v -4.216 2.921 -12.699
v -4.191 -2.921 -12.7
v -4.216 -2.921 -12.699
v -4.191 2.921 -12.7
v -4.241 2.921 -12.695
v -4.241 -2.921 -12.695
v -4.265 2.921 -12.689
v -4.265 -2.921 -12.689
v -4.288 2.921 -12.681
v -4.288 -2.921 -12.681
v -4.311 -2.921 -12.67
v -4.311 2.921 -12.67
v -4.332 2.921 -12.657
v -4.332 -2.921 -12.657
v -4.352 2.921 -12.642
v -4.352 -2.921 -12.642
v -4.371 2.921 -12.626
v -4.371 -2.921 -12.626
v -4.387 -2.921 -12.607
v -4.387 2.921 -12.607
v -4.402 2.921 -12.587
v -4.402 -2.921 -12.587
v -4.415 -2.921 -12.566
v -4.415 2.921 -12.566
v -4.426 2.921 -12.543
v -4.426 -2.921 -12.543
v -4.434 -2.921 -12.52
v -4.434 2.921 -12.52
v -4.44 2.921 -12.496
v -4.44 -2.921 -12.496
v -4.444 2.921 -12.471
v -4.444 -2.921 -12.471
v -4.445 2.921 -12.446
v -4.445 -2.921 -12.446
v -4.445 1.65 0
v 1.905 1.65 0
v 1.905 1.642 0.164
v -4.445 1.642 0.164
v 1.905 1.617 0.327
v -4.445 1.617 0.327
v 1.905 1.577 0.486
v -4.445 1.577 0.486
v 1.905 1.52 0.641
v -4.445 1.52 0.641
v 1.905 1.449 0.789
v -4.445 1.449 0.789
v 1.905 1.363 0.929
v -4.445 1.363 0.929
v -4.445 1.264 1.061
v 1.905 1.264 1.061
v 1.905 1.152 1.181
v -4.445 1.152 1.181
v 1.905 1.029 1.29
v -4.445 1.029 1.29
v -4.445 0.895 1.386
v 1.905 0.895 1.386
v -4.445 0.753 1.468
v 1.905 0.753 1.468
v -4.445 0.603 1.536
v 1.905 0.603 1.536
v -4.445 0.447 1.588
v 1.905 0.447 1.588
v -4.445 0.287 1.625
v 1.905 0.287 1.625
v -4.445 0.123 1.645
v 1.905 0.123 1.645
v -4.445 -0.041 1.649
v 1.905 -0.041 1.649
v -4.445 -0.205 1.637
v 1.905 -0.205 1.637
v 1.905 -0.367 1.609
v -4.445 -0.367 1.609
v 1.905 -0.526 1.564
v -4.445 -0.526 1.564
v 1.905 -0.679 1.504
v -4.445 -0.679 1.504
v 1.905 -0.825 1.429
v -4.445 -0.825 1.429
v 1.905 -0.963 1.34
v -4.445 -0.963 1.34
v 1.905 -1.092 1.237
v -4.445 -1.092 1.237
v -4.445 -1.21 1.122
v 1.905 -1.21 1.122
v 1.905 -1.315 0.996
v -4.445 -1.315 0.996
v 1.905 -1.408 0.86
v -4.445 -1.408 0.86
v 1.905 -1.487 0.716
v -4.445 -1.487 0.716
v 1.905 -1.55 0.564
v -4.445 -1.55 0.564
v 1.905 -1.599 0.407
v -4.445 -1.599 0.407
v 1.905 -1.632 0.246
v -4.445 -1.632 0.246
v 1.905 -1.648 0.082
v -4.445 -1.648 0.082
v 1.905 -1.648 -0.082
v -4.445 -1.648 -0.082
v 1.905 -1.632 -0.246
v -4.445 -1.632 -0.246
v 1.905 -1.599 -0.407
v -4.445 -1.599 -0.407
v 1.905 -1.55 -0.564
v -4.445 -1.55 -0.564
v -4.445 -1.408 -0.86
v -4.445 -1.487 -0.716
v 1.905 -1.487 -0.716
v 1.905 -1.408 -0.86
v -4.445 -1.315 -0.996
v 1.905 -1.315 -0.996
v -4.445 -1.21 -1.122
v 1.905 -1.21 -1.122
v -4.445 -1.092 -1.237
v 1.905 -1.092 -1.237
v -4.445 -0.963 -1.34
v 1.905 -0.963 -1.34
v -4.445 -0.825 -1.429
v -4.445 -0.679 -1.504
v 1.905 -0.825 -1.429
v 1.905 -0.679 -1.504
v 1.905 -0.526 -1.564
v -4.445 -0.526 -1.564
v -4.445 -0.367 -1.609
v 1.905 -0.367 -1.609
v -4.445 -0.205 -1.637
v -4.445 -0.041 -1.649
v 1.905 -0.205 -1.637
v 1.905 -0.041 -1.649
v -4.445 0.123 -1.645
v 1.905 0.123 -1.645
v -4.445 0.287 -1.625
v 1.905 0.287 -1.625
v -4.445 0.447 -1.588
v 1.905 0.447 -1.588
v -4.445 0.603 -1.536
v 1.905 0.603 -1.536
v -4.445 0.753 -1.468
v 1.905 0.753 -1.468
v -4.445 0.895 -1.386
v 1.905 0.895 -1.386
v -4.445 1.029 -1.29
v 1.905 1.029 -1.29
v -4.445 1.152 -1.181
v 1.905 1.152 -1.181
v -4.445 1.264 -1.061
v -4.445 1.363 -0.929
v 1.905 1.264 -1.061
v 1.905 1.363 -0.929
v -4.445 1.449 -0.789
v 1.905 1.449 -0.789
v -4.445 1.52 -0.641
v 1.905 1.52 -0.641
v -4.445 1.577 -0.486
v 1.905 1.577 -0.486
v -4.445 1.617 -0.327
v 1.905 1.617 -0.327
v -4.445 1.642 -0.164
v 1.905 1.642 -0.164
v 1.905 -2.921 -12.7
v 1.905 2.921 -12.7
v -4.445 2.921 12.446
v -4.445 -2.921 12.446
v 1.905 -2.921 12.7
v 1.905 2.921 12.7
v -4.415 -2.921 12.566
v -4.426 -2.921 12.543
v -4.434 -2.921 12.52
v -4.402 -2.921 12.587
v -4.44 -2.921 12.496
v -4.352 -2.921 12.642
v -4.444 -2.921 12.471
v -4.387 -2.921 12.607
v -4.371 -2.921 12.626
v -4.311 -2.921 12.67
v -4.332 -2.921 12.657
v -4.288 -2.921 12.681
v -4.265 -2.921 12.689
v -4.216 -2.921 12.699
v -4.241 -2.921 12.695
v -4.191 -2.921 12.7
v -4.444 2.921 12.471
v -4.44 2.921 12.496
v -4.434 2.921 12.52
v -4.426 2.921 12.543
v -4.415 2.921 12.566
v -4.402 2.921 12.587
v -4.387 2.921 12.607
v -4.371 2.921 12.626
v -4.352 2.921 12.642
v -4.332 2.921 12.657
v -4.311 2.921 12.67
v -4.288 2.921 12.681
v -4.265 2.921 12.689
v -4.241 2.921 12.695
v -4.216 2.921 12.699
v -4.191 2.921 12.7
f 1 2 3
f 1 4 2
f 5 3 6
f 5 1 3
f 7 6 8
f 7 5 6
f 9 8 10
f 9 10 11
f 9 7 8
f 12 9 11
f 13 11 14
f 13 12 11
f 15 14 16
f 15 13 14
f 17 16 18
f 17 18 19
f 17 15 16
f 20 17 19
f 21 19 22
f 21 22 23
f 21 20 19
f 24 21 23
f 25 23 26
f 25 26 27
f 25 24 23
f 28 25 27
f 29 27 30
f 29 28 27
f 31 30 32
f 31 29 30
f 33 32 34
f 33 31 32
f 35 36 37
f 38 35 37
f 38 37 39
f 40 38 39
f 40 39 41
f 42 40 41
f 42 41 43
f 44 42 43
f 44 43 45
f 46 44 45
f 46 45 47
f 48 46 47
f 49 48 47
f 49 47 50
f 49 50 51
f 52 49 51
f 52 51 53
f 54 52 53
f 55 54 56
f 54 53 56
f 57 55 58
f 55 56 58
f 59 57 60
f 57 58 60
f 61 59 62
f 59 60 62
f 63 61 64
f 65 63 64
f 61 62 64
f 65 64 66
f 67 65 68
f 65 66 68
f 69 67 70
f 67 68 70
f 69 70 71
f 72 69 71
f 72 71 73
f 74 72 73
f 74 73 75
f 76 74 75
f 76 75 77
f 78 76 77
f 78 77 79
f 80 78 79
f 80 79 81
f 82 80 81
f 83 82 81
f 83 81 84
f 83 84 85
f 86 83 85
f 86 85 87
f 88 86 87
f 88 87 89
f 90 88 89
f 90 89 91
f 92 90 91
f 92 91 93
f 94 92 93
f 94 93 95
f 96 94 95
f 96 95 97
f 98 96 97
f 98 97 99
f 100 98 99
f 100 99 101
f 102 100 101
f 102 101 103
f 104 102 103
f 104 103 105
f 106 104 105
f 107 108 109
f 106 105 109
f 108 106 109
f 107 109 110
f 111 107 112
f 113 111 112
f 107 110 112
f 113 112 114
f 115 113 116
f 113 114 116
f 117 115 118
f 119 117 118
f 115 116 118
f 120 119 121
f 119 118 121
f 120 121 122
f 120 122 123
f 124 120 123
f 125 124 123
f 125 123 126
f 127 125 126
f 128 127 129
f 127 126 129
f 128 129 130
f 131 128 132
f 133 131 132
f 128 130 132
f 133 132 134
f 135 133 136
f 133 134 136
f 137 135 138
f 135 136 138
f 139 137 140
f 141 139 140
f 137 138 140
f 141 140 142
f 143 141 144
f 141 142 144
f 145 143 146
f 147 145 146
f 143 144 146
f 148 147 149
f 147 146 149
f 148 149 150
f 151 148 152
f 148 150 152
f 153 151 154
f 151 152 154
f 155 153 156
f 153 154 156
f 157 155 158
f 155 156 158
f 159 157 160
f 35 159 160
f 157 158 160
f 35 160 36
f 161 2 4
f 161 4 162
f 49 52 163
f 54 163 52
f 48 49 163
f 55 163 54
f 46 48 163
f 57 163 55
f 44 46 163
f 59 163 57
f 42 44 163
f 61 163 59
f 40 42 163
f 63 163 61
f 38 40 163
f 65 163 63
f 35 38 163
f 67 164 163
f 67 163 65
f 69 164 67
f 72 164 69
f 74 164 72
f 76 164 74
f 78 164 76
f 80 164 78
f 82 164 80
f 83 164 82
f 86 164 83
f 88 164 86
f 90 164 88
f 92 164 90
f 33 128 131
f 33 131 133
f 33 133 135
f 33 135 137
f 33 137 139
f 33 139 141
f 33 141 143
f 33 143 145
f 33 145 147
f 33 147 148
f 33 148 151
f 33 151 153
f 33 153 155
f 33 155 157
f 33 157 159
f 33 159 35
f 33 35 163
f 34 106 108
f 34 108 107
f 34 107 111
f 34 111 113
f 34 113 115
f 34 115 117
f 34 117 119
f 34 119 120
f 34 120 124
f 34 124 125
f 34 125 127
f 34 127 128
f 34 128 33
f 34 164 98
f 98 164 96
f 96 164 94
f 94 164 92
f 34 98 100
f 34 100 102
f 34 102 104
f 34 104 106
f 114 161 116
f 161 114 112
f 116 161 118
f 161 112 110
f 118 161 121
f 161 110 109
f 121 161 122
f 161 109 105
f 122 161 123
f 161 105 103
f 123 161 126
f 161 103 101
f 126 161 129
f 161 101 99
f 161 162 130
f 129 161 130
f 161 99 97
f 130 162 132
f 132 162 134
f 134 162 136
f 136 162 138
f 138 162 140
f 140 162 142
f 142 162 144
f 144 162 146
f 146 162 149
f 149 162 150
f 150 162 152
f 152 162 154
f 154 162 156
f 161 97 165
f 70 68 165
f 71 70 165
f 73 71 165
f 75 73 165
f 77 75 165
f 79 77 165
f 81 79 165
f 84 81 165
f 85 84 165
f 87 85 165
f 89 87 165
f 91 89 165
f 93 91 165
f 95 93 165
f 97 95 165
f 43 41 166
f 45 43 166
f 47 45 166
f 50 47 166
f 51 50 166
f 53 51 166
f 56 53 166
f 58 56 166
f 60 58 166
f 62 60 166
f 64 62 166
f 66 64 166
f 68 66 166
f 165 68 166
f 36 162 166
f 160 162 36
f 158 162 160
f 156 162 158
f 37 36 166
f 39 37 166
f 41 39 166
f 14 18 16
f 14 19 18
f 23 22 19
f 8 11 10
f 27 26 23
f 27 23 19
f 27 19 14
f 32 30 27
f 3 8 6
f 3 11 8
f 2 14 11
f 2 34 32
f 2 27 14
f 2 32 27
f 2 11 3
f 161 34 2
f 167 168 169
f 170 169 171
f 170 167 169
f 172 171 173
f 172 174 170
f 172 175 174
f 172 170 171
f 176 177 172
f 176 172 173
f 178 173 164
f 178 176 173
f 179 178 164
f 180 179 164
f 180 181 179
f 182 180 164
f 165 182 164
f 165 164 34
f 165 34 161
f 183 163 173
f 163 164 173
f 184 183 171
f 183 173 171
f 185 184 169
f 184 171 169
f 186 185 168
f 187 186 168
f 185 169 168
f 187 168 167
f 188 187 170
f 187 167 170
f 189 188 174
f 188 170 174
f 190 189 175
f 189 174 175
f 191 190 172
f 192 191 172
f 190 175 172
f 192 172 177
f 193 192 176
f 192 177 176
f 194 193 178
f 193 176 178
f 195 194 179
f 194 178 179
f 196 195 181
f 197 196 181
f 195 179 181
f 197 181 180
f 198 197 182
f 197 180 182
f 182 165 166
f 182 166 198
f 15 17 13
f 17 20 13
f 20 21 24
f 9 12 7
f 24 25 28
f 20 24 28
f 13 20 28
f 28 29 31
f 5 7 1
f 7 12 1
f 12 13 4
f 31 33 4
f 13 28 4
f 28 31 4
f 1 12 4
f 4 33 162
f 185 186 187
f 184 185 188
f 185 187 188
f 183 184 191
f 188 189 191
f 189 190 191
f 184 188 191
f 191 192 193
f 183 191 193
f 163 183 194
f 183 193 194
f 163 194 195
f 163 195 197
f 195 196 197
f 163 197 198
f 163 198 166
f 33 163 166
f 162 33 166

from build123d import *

# Parameters (mm, degrees)
F1_DEPTH = 2.921
F2_R     = 1.65
F3_DEPTH = 25.4
F4_W     = 8.591786
F4_H     = 32.204256
F5_DEPTH = 25.4
F6_R     = 0.254


with BuildPart() as f1:
    # F0 (on Front) → F1 (new body, symmetric)
    with BuildSketch(Plane.XZ):
        with BuildLine():
            Line((4.445, -12.7), (4.445, 12.7))
            Line((4.445, 12.7), (-4.445, 12.7))
            ThreePointArc((-4.445, 12.7), (-3.7846, 12.0396), (-4.445, 11.3792))
            Line((-4.445, 11.3792), (-4.445, 10.6934))
            ThreePointArc((-4.445, 10.6934), (-3.7846, 10.033), (-4.445, 9.3726))
            Line((-4.445, 9.3726), (-4.445, 8.6868))
            ThreePointArc((-4.445, 8.6868), (-3.7846, 8.0264), (-4.445, 7.366))
            Line((-4.445, 7.366), (-4.445, 6.6802))
            ThreePointArc((-4.445, 6.6802), (-3.7846, 6.0198), (-4.445, 5.3594))
            Line((-4.445, 5.3594), (-4.445, 4.6736))
            ThreePointArc((-4.445, 4.6736), (-3.7846, 4.0132), (-4.445, 3.3528))
            Line((-4.445, 3.3528), (-4.445, 2.667))
            ThreePointArc((-4.445, 2.667), (-3.7846, 2.0066), (-4.445, 1.3462))
            Line((-4.445, 1.3462), (-4.445, 0.6604))
            ThreePointArc((-4.445, 0.6604), (-3.7846, 0), (-4.445, -0.6604))
            Line((-4.445, -0.6604), (-4.445, -1.3462))
            ThreePointArc((-4.445, -1.3462), (-3.7846, -2.0066), (-4.445, -2.667))
            Line((-4.445, -2.667), (-4.445, -3.3528))
            ThreePointArc((-4.445, -3.3528), (-3.7846, -4.0132), (-4.445, -4.6736))
            Line((-4.445, -4.6736), (-4.445, -5.3594))
            ThreePointArc((-4.445, -5.3594), (-3.7846, -6.0198), (-4.445, -6.6802))
            Line((-4.445, -6.6802), (-4.445, -7.366))
            ThreePointArc((-4.445, -7.366), (-3.7846, -8.0264), (-4.445, -8.6868))
            Line((-4.445, -8.6868), (-4.445, -9.3726))
            ThreePointArc((-4.445, -9.3726), (-3.7846, -10.033), (-4.445, -10.6934))
            Line((-4.445, -10.6934), (-4.445, -11.3792))
            ThreePointArc((-4.445, -11.3792), (-3.7846, -12.0396), (-4.445, -12.7))
            Line((-4.445, -12.7), (4.445, -12.7))
        make_face()
        with BuildLine():
            ThreePointArc((-4.445, 11.3792), (-3.7846, 12.0396), (-4.445, 12.7))
            Line((-4.445, 12.7), (-4.445, 11.3792))
        make_face()
        with BuildLine():
            Line((-4.445, -11.5316), (-4.445, -12.7))
            ThreePointArc((-4.445, -12.7), (-3.7846, -12.0396), (-4.445, -11.3792))
            Line((-4.445, -11.3792), (-4.445, -11.5316))
        make_face()
        with BuildLine():
            ThreePointArc((-4.445, 9.3726), (-3.7846, 10.033), (-4.445, 10.6934))
            Line((-4.445, 10.6934), (-4.445, 10.541))
            Line((-4.445, 10.541), (-4.445, 9.3726))
        make_face()
        with BuildLine():
            Line((-4.445, -9.525), (-4.445, -10.6934))
            ThreePointArc((-4.445, -10.6934), (-3.7846, -10.033), (-4.445, -9.3726))
            Line((-4.445, -9.3726), (-4.445, -9.525))
        make_face()
        with BuildLine():
            ThreePointArc((-4.445, 7.366), (-3.7846, 8.0264), (-4.445, 8.6868))
            Line((-4.445, 8.6868), (-4.445, 8.5344))
            Line((-4.445, 8.5344), (-4.445, 7.366))
        make_face()
        with BuildLine():
            Line((-4.445, -7.5184), (-4.445, -8.6868))
            ThreePointArc((-4.445, -8.6868), (-3.7846, -8.0264), (-4.445, -7.366))
            Line((-4.445, -7.366), (-4.445, -7.5184))
        make_face()
        with BuildLine():
            ThreePointArc((-4.445, 5.3594), (-3.7846, 6.0198), (-4.445, 6.6802))
            Line((-4.445, 6.6802), (-4.445, 6.5278))
            Line((-4.445, 6.5278), (-4.445, 5.3594))
        make_face()
        with BuildLine():
            Line((-4.445, -5.5118), (-4.445, -6.6802))
            ThreePointArc((-4.445, -6.6802), (-3.7846, -6.0198), (-4.445, -5.3594))
            Line((-4.445, -5.3594), (-4.445, -5.5118))
        make_face()
        with BuildLine():
            ThreePointArc((-4.445, 3.3528), (-3.7846, 4.0132), (-4.445, 4.6736))
            Line((-4.445, 4.6736), (-4.445, 4.5212))
            Line((-4.445, 4.5212), (-4.445, 3.3528))
        make_face()
        with BuildLine():
            Line((-4.445, -3.5052), (-4.445, -4.6736))
            ThreePointArc((-4.445, -4.6736), (-3.7846, -4.0132), (-4.445, -3.3528))
            Line((-4.445, -3.3528), (-4.445, -3.5052))
        make_face()
        with BuildLine():
            ThreePointArc((-4.445, 1.3462), (-3.7846, 2.0066), (-4.445, 2.667))
            Line((-4.445, 2.667), (-4.445, 2.5146))
            Line((-4.445, 2.5146), (-4.445, 1.3462))
        make_face()
        with BuildLine():
            Line((-4.445, -1.4986), (-4.445, -2.667))
            ThreePointArc((-4.445, -2.667), (-3.7846, -2.0066), (-4.445, -1.3462))
            Line((-4.445, -1.3462), (-4.445, -1.4986))
        make_face()
        with BuildLine():
            ThreePointArc((-4.445, -0.6604), (-3.7846, 0), (-4.445, 0.6604))
            Line((-4.445, 0.6604), (-4.445, 0.508))
            Line((-4.445, 0.508), (-4.445, -0.6604))
        make_face()
    extrude(amount=F1_DEPTH, both=True)

    # F2 (on face) → F3 (cut)
    with BuildSketch(Plane.YZ.offset(4.445)):
        Circle(F2_R)
    extrude(amount=-F3_DEPTH, mode=Mode.SUBTRACT)

    # F4 (on face) → F5 (cut)
    with BuildSketch(Plane(origin=(0, 2.921, 0), x_dir=(-1, 0, 0), z_dir=(0, 1, 0))):
        with Locations((-6.200893, 0)):
            Rectangle(F4_W, F4_H)
    extrude(amount=-F5_DEPTH, mode=Mode.SUBTRACT)

    # F6
    f6_edges = [f1.edges().sort_by_distance(p)[0] for p in [
        (-4.445, 0, 12.7),
        (-4.445, 0, -12.7),
    ]]
    fillet(f6_edges, radius=F6_R)


solid = f1.part
